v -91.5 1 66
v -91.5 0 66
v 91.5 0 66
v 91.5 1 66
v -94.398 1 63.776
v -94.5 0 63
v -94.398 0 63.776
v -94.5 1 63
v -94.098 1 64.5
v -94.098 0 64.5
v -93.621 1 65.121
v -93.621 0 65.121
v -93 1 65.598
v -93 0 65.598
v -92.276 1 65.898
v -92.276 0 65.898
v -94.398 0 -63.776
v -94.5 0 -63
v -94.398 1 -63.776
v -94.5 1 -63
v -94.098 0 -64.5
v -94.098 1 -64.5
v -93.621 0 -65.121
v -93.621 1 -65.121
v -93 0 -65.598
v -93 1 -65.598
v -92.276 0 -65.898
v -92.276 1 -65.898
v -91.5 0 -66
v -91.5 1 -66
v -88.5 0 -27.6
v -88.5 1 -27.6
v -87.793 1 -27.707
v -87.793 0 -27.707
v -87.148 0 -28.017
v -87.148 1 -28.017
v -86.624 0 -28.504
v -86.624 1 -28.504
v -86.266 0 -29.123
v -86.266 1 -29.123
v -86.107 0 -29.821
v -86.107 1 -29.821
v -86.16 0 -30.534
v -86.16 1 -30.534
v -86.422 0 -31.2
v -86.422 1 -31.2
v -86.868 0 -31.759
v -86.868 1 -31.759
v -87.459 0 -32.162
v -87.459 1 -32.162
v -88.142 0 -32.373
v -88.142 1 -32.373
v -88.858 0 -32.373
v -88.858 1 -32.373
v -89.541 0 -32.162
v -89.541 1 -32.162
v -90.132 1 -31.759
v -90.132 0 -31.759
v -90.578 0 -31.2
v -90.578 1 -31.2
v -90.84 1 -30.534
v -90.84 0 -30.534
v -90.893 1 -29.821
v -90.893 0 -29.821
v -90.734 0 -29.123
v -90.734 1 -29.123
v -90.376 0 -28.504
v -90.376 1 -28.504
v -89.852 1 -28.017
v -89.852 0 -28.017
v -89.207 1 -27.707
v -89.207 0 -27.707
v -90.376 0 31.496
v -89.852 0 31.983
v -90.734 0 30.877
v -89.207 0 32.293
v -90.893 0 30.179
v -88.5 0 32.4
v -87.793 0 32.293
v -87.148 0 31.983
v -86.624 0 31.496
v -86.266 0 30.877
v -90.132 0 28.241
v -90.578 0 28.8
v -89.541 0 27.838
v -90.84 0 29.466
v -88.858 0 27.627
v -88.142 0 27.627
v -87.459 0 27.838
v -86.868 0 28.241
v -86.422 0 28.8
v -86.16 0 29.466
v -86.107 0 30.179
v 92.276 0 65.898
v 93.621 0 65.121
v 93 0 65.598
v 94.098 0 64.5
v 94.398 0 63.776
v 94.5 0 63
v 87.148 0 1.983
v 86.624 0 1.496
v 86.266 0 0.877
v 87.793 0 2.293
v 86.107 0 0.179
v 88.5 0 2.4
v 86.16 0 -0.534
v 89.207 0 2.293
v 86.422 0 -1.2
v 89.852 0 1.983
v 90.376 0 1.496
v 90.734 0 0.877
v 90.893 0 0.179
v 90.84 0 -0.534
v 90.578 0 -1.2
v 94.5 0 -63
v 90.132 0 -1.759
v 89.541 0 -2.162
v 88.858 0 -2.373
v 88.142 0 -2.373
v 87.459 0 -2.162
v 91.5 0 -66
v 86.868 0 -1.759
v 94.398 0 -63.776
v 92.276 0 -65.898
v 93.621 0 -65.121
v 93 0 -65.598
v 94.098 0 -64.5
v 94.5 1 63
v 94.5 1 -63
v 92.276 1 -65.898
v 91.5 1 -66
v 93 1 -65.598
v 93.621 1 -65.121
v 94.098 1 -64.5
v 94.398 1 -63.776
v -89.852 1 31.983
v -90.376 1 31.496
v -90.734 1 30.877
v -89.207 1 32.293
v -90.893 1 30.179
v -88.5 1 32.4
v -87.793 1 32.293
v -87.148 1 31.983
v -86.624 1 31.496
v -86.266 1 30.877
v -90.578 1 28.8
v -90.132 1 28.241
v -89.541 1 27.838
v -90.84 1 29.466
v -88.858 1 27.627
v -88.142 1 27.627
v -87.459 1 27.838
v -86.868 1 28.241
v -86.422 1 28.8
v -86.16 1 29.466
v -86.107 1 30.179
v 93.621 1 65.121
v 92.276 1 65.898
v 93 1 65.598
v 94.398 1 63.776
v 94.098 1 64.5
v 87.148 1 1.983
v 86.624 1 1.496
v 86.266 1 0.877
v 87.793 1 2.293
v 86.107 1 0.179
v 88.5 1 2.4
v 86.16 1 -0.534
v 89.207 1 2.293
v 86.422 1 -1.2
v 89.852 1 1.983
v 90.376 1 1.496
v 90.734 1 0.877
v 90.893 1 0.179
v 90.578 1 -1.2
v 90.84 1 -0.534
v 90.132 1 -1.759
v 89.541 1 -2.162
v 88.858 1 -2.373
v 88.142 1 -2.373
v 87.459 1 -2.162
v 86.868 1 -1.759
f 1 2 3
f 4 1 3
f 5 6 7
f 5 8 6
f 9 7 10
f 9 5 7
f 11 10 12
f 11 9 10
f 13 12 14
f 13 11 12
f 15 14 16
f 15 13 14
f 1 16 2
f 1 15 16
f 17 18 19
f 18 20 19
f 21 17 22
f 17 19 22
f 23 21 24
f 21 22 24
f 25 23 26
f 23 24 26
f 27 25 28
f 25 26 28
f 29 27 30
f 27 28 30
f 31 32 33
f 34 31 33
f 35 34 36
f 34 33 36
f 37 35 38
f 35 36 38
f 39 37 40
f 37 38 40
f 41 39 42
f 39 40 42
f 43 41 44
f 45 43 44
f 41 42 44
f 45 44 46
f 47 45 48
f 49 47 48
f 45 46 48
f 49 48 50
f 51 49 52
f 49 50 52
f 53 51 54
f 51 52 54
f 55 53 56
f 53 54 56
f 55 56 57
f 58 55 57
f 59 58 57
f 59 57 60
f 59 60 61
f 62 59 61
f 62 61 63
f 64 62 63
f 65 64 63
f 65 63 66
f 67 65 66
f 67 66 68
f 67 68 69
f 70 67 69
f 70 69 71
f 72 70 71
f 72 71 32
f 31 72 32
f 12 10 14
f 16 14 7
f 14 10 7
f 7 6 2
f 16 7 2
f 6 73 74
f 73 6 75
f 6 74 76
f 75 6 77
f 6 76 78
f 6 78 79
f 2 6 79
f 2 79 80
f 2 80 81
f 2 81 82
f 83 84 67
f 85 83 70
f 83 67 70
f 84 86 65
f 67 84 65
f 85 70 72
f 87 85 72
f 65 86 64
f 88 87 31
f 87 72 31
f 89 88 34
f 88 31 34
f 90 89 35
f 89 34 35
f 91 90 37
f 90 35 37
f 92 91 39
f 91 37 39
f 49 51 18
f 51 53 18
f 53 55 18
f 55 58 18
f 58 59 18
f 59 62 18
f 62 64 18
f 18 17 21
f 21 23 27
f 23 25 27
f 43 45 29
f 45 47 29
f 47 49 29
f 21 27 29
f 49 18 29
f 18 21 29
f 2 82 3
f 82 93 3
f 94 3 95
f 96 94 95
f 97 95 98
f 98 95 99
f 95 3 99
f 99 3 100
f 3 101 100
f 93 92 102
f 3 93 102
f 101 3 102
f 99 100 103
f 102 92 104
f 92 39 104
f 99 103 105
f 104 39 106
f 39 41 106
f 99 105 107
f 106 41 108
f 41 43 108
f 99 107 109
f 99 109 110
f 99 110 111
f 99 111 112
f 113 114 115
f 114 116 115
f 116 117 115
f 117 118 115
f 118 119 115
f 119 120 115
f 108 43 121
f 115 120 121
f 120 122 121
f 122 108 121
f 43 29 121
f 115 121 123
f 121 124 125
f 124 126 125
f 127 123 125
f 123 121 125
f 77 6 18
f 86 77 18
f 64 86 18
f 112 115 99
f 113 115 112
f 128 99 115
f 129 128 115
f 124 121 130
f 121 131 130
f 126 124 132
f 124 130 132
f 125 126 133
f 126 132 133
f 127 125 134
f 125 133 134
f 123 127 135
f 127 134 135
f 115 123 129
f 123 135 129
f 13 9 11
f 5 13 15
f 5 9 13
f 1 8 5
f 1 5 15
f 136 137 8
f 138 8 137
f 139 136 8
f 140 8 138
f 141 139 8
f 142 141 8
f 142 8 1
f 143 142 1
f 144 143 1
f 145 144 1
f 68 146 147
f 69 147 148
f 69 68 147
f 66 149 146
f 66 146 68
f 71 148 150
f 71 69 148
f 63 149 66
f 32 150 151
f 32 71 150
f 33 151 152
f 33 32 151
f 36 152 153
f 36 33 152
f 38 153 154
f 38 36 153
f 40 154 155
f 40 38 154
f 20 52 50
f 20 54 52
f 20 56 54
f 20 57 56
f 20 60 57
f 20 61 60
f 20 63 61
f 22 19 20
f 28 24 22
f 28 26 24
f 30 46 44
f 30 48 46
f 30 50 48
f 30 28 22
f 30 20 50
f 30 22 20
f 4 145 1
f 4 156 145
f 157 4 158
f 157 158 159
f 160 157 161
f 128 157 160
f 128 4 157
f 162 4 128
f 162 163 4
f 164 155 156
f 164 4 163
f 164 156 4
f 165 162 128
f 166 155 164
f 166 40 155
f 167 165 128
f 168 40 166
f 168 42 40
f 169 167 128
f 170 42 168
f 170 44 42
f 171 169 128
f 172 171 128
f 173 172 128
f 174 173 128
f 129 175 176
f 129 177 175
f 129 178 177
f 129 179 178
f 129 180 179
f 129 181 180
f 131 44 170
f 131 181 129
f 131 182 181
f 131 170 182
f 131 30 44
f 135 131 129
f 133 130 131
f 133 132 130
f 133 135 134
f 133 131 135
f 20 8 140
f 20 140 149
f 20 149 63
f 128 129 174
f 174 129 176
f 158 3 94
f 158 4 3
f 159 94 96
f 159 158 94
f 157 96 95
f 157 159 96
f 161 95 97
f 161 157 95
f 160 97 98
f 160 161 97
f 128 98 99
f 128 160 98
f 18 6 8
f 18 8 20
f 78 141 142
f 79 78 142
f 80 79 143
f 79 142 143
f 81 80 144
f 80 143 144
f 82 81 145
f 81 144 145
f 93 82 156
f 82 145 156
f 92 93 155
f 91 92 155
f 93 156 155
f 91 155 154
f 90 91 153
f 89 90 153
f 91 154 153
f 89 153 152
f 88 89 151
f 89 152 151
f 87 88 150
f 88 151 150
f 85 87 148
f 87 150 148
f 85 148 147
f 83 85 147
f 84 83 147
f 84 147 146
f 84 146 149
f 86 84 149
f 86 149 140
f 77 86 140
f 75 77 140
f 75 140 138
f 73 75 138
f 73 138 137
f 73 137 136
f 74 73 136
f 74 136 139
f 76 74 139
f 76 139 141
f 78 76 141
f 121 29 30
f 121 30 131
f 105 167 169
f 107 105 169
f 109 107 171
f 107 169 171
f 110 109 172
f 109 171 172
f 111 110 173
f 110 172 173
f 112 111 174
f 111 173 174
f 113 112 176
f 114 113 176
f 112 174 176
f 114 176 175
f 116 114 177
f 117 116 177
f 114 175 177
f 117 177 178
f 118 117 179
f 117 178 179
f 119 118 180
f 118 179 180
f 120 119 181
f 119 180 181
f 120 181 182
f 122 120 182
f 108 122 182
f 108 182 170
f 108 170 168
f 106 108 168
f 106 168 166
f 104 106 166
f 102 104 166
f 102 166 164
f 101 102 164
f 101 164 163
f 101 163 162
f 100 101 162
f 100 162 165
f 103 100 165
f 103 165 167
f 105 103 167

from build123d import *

# Parameters (mm, degrees)
SKETCH1_W           = 189
SKETCH1_H           = 132
BOSS_EXTRUDE1_DEPTH = 1
SKETCH3_R           = 2.4
CUT_EXTRUDE1_DEPTH  = 116.270334432
FILLET1_R           = 3


with BuildPart() as part:
    # Sketch1 → Boss-Extrude1 (new body)
    with BuildSketch(Plane(origin=(0, 0, 0), x_dir=(1, 0, 0), z_dir=(0, 1, 0))):
        Rectangle(SKETCH1_W, SKETCH1_H)
    extrude(amount=BOSS_EXTRUDE1_DEPTH)

    # Sketch3 → Cut-Extrude1 (cut, through all)
    with BuildSketch(Plane(origin=(0, 1, 0), x_dir=(1, 0, 0), z_dir=(0, 1, 0))):
        with Locations(Location((88.5, 0, 0), (0, 0, 270))):
            Circle(SKETCH3_R)
        with Locations(Location((-88.5, -30, 0), (0, 0, 270))):
            Circle(SKETCH3_R)
        with Locations(Location((-88.5, 30, 0), (0, 0, 270))):
            Circle(SKETCH3_R)
    extrude(amount=-CUT_EXTRUDE1_DEPTH, mode=Mode.SUBTRACT)

    # Fillet1
    fillet1_edges = [part.edges().sort_by_distance(p)[0] for p in [
        (94.5, 0.5, 66),
        (-94.5, 0.5, 66),
        (-94.5, 0.5, -66),
        (94.5, 0.5, -66),
    ]]
    fillet(fillet1_edges, radius=FILLET1_R)


solid = part.part
